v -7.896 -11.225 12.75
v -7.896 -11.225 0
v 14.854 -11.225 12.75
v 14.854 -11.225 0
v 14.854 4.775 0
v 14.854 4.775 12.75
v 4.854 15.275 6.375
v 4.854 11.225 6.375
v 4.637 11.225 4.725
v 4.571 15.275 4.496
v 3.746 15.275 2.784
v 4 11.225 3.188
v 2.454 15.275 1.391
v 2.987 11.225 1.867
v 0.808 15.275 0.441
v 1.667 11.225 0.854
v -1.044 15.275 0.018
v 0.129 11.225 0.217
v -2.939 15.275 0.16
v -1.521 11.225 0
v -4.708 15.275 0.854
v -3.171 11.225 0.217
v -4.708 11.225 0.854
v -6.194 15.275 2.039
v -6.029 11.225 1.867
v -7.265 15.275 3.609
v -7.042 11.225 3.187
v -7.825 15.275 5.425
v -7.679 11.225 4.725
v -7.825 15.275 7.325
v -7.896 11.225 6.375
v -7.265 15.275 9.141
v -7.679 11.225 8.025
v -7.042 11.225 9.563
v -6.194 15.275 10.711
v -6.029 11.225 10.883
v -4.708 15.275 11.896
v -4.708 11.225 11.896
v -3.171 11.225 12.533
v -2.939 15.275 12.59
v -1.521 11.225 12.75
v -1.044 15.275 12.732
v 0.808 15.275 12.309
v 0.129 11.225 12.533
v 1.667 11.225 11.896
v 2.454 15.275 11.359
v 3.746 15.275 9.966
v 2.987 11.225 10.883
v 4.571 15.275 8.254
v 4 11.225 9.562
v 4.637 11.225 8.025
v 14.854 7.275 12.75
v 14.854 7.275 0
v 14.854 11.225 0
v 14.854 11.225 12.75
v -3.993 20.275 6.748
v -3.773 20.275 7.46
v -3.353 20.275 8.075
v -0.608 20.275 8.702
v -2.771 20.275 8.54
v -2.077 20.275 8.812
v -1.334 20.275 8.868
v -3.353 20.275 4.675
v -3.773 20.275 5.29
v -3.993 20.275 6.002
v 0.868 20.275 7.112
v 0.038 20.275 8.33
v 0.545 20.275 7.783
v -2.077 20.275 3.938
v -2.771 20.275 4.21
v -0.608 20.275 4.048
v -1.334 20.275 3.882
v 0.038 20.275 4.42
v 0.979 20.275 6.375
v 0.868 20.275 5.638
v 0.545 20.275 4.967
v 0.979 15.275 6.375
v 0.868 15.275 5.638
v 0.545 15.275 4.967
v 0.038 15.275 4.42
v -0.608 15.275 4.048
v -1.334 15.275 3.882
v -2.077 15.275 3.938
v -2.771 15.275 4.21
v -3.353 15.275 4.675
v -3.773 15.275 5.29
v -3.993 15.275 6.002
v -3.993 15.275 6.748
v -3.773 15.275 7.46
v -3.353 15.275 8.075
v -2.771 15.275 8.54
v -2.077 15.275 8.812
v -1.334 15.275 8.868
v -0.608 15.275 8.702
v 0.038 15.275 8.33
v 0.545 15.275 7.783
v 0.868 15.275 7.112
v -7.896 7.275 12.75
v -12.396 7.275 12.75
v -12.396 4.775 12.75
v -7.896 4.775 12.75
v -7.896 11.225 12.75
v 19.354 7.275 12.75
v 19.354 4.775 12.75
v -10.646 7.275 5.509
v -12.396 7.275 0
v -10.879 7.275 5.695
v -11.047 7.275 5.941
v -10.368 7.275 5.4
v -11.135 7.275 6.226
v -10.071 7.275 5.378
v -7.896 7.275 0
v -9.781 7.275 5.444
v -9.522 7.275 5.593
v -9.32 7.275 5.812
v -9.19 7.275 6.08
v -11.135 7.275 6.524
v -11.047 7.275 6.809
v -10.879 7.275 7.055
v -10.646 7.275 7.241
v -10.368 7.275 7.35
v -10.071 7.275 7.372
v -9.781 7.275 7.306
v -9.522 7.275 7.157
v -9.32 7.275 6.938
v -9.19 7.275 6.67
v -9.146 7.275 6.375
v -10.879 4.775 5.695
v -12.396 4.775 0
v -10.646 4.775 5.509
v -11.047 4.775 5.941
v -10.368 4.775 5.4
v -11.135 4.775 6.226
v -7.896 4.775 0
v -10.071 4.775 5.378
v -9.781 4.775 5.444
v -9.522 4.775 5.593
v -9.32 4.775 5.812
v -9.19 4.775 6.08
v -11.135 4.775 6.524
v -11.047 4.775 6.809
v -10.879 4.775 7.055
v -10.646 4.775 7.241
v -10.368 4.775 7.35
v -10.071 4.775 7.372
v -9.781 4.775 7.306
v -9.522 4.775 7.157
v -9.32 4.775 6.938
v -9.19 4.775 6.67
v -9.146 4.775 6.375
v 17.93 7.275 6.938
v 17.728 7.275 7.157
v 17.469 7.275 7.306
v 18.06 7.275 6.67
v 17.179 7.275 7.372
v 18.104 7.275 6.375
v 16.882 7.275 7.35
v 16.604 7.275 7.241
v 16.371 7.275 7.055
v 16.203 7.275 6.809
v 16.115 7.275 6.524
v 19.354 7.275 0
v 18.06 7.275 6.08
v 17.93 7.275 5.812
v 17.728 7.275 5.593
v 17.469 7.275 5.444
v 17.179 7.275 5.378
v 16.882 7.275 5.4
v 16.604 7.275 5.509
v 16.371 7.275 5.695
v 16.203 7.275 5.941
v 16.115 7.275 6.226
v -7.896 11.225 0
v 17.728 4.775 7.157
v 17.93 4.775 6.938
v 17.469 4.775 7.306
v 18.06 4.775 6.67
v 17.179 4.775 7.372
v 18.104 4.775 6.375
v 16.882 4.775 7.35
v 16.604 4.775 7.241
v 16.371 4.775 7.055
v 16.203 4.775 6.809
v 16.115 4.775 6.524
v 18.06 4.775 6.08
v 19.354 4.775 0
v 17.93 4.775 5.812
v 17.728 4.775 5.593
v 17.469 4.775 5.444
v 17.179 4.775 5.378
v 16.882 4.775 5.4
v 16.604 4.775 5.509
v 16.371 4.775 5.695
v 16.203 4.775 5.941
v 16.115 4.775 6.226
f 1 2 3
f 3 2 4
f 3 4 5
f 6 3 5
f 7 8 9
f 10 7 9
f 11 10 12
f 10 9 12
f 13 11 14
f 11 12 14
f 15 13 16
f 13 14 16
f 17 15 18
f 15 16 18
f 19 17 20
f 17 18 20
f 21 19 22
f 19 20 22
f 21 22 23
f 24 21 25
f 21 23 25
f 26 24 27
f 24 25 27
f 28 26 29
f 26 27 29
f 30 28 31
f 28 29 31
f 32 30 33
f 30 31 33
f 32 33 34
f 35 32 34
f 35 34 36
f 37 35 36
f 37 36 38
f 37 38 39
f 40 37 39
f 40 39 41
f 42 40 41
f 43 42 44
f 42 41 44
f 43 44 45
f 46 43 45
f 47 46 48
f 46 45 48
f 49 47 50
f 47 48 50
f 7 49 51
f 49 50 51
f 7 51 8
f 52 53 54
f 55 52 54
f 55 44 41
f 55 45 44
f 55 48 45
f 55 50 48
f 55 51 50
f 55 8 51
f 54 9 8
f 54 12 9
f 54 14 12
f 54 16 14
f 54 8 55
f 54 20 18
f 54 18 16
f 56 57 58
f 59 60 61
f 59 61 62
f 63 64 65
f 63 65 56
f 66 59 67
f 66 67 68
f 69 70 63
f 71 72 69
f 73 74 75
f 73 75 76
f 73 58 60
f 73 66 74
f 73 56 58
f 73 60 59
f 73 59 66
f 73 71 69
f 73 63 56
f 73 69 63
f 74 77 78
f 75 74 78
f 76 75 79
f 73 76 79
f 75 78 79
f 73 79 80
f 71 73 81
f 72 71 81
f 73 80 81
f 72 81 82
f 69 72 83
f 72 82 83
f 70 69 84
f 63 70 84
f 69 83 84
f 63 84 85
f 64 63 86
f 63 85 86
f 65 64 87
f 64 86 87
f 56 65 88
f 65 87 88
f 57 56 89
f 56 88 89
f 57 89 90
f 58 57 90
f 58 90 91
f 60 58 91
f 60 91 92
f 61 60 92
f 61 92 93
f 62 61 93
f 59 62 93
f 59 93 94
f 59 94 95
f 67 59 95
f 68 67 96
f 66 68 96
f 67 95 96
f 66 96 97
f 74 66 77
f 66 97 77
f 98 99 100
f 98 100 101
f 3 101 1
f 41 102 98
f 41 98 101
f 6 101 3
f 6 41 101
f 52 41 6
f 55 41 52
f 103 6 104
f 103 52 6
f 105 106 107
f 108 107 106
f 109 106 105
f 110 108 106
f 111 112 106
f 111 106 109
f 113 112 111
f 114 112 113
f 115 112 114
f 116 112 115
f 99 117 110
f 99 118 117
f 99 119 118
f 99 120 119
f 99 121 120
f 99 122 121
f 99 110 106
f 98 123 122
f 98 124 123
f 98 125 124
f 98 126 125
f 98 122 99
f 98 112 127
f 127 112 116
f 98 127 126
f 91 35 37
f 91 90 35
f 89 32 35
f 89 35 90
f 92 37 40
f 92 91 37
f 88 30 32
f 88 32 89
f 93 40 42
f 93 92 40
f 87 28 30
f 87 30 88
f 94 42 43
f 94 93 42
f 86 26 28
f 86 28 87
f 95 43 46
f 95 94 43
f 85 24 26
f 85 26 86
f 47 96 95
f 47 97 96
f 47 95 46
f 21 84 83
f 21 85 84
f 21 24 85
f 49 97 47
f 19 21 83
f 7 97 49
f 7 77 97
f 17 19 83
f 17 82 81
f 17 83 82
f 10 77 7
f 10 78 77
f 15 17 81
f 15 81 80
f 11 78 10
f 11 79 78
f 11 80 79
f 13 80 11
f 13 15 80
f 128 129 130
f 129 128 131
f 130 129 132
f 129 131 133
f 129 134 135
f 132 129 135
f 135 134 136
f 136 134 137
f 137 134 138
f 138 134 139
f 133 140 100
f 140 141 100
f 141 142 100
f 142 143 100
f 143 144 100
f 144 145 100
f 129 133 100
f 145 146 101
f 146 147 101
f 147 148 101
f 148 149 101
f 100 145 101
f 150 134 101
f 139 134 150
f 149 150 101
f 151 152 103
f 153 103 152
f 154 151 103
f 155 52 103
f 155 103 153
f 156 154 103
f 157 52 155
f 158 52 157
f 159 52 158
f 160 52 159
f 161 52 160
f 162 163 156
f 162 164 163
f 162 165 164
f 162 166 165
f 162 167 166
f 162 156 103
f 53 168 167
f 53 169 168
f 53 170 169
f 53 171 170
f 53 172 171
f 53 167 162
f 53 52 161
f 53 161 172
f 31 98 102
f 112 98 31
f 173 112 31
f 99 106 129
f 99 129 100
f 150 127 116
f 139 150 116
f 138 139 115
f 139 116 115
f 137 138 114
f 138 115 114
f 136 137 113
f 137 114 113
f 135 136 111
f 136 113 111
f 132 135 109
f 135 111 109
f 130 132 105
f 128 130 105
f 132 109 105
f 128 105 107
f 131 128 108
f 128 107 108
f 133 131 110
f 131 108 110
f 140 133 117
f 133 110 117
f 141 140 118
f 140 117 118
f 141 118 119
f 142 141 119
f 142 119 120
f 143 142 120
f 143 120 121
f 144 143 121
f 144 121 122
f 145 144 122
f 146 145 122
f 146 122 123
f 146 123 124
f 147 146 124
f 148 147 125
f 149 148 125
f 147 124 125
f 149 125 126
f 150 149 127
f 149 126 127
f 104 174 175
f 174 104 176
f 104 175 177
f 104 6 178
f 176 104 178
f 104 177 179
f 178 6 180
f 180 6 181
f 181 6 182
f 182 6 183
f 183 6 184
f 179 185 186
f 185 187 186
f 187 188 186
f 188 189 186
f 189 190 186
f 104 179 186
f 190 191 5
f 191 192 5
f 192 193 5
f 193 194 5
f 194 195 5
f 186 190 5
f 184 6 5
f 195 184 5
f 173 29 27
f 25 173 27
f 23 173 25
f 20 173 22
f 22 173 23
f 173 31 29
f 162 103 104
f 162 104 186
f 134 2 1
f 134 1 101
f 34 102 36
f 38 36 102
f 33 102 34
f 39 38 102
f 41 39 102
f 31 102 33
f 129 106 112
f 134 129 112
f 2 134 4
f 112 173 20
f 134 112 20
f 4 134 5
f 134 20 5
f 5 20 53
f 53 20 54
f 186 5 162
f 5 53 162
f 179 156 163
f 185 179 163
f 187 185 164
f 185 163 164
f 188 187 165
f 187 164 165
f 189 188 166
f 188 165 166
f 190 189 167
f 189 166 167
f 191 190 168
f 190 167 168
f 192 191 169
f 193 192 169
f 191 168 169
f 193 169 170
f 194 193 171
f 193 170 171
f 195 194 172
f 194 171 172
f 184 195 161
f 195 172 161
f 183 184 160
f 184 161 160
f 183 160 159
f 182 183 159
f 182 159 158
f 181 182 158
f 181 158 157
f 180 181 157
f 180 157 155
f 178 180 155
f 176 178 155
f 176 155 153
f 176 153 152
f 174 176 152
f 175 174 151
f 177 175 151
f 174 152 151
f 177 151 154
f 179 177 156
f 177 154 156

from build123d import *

# Parameters (mm, degrees)
SKETCH1_W           = 22.75
SKETCH1_H           = 22.45
BOSS_EXTRUDE1_DEPTH = 12.75
SKETCH2_W           = 12.75
SKETCH2_H           = 2.5
BOSS_EXTRUDE2_DEPTH = 4.5
SKETCH3_W           = 12.75
SKETCH3_H           = 2.5
BOSS_EXTRUDE3_DEPTH = 4.5
SKETCH4_R           = 1
CUT_EXTRUDE1_DEPTH  = 2.5
SKETCH5_R           = 1
CUT_EXTRUDE2_DEPTH  = 2.5
SKETCH6_R           = 6.375
BOSS_EXTRUDE4_DEPTH = 4.05
SKETCH7_R           = 2.5
BOSS_EXTRUDE5_DEPTH = 5


with BuildPart() as part:
    # Sketch1 → Boss-Extrude1 (new body)
    with BuildSketch(Plane.XY):
        with Locations((3.479135338, 0)):
            Rectangle(SKETCH1_W, SKETCH1_H)
    extrude(amount=BOSS_EXTRUDE1_DEPTH)

    # Sketch2 → Boss-Extrude2 (add)
    with BuildSketch(Plane(origin=(14.854135338, 0, 0), x_dir=(0, 0, -1), z_dir=(1, 0, 0))):
        with Locations((-6.375, 6.025)):
            Rectangle(SKETCH2_W, SKETCH2_H)
    extrude(amount=BOSS_EXTRUDE2_DEPTH)

    # Sketch3 → Boss-Extrude3 (add)
    with BuildSketch(Plane.ZY.offset(7.895864662)):
        with Locations((6.375, 6.025)):
            Rectangle(SKETCH3_W, SKETCH3_H)
    extrude(amount=BOSS_EXTRUDE3_DEPTH)

    # Sketch4 → Cut-Extrude1 (cut)
    with BuildSketch(Plane(origin=(0, 7.275, 0), x_dir=(1, 0, 0), z_dir=(0, 1, 0))):
        with Locations((-10.145864662, -6.375)):
            Circle(SKETCH4_R)
    extrude(amount=-CUT_EXTRUDE1_DEPTH, mode=Mode.SUBTRACT)

    # Sketch5 → Cut-Extrude2 (cut)
    with BuildSketch(Plane(origin=(0, 7.275, 0), x_dir=(1, 0, 0), z_dir=(0, 1, 0))):
        with Locations((17.104135338, -6.375)):
            Circle(SKETCH5_R)
    extrude(amount=-CUT_EXTRUDE2_DEPTH, mode=Mode.SUBTRACT)

    # Sketch6 → Boss-Extrude4 (add)
    with BuildSketch(Plane(origin=(0, 11.225, 0), x_dir=(1, 0, 0), z_dir=(0, 1, 0))):
        with Locations((-1.520864662, -6.375)):
            Circle(SKETCH6_R)
    extrude(amount=BOSS_EXTRUDE4_DEPTH)

    # Sketch7 → Boss-Extrude5 (add)
    with BuildSketch(Plane(origin=(0, 15.275, 0), x_dir=(1, 0, 0), z_dir=(0, 1, 0))):
        with Locations((-1.520864662, -6.375)):
            Circle(SKETCH7_R)
    extrude(amount=BOSS_EXTRUDE5_DEPTH)


solid = part.part
